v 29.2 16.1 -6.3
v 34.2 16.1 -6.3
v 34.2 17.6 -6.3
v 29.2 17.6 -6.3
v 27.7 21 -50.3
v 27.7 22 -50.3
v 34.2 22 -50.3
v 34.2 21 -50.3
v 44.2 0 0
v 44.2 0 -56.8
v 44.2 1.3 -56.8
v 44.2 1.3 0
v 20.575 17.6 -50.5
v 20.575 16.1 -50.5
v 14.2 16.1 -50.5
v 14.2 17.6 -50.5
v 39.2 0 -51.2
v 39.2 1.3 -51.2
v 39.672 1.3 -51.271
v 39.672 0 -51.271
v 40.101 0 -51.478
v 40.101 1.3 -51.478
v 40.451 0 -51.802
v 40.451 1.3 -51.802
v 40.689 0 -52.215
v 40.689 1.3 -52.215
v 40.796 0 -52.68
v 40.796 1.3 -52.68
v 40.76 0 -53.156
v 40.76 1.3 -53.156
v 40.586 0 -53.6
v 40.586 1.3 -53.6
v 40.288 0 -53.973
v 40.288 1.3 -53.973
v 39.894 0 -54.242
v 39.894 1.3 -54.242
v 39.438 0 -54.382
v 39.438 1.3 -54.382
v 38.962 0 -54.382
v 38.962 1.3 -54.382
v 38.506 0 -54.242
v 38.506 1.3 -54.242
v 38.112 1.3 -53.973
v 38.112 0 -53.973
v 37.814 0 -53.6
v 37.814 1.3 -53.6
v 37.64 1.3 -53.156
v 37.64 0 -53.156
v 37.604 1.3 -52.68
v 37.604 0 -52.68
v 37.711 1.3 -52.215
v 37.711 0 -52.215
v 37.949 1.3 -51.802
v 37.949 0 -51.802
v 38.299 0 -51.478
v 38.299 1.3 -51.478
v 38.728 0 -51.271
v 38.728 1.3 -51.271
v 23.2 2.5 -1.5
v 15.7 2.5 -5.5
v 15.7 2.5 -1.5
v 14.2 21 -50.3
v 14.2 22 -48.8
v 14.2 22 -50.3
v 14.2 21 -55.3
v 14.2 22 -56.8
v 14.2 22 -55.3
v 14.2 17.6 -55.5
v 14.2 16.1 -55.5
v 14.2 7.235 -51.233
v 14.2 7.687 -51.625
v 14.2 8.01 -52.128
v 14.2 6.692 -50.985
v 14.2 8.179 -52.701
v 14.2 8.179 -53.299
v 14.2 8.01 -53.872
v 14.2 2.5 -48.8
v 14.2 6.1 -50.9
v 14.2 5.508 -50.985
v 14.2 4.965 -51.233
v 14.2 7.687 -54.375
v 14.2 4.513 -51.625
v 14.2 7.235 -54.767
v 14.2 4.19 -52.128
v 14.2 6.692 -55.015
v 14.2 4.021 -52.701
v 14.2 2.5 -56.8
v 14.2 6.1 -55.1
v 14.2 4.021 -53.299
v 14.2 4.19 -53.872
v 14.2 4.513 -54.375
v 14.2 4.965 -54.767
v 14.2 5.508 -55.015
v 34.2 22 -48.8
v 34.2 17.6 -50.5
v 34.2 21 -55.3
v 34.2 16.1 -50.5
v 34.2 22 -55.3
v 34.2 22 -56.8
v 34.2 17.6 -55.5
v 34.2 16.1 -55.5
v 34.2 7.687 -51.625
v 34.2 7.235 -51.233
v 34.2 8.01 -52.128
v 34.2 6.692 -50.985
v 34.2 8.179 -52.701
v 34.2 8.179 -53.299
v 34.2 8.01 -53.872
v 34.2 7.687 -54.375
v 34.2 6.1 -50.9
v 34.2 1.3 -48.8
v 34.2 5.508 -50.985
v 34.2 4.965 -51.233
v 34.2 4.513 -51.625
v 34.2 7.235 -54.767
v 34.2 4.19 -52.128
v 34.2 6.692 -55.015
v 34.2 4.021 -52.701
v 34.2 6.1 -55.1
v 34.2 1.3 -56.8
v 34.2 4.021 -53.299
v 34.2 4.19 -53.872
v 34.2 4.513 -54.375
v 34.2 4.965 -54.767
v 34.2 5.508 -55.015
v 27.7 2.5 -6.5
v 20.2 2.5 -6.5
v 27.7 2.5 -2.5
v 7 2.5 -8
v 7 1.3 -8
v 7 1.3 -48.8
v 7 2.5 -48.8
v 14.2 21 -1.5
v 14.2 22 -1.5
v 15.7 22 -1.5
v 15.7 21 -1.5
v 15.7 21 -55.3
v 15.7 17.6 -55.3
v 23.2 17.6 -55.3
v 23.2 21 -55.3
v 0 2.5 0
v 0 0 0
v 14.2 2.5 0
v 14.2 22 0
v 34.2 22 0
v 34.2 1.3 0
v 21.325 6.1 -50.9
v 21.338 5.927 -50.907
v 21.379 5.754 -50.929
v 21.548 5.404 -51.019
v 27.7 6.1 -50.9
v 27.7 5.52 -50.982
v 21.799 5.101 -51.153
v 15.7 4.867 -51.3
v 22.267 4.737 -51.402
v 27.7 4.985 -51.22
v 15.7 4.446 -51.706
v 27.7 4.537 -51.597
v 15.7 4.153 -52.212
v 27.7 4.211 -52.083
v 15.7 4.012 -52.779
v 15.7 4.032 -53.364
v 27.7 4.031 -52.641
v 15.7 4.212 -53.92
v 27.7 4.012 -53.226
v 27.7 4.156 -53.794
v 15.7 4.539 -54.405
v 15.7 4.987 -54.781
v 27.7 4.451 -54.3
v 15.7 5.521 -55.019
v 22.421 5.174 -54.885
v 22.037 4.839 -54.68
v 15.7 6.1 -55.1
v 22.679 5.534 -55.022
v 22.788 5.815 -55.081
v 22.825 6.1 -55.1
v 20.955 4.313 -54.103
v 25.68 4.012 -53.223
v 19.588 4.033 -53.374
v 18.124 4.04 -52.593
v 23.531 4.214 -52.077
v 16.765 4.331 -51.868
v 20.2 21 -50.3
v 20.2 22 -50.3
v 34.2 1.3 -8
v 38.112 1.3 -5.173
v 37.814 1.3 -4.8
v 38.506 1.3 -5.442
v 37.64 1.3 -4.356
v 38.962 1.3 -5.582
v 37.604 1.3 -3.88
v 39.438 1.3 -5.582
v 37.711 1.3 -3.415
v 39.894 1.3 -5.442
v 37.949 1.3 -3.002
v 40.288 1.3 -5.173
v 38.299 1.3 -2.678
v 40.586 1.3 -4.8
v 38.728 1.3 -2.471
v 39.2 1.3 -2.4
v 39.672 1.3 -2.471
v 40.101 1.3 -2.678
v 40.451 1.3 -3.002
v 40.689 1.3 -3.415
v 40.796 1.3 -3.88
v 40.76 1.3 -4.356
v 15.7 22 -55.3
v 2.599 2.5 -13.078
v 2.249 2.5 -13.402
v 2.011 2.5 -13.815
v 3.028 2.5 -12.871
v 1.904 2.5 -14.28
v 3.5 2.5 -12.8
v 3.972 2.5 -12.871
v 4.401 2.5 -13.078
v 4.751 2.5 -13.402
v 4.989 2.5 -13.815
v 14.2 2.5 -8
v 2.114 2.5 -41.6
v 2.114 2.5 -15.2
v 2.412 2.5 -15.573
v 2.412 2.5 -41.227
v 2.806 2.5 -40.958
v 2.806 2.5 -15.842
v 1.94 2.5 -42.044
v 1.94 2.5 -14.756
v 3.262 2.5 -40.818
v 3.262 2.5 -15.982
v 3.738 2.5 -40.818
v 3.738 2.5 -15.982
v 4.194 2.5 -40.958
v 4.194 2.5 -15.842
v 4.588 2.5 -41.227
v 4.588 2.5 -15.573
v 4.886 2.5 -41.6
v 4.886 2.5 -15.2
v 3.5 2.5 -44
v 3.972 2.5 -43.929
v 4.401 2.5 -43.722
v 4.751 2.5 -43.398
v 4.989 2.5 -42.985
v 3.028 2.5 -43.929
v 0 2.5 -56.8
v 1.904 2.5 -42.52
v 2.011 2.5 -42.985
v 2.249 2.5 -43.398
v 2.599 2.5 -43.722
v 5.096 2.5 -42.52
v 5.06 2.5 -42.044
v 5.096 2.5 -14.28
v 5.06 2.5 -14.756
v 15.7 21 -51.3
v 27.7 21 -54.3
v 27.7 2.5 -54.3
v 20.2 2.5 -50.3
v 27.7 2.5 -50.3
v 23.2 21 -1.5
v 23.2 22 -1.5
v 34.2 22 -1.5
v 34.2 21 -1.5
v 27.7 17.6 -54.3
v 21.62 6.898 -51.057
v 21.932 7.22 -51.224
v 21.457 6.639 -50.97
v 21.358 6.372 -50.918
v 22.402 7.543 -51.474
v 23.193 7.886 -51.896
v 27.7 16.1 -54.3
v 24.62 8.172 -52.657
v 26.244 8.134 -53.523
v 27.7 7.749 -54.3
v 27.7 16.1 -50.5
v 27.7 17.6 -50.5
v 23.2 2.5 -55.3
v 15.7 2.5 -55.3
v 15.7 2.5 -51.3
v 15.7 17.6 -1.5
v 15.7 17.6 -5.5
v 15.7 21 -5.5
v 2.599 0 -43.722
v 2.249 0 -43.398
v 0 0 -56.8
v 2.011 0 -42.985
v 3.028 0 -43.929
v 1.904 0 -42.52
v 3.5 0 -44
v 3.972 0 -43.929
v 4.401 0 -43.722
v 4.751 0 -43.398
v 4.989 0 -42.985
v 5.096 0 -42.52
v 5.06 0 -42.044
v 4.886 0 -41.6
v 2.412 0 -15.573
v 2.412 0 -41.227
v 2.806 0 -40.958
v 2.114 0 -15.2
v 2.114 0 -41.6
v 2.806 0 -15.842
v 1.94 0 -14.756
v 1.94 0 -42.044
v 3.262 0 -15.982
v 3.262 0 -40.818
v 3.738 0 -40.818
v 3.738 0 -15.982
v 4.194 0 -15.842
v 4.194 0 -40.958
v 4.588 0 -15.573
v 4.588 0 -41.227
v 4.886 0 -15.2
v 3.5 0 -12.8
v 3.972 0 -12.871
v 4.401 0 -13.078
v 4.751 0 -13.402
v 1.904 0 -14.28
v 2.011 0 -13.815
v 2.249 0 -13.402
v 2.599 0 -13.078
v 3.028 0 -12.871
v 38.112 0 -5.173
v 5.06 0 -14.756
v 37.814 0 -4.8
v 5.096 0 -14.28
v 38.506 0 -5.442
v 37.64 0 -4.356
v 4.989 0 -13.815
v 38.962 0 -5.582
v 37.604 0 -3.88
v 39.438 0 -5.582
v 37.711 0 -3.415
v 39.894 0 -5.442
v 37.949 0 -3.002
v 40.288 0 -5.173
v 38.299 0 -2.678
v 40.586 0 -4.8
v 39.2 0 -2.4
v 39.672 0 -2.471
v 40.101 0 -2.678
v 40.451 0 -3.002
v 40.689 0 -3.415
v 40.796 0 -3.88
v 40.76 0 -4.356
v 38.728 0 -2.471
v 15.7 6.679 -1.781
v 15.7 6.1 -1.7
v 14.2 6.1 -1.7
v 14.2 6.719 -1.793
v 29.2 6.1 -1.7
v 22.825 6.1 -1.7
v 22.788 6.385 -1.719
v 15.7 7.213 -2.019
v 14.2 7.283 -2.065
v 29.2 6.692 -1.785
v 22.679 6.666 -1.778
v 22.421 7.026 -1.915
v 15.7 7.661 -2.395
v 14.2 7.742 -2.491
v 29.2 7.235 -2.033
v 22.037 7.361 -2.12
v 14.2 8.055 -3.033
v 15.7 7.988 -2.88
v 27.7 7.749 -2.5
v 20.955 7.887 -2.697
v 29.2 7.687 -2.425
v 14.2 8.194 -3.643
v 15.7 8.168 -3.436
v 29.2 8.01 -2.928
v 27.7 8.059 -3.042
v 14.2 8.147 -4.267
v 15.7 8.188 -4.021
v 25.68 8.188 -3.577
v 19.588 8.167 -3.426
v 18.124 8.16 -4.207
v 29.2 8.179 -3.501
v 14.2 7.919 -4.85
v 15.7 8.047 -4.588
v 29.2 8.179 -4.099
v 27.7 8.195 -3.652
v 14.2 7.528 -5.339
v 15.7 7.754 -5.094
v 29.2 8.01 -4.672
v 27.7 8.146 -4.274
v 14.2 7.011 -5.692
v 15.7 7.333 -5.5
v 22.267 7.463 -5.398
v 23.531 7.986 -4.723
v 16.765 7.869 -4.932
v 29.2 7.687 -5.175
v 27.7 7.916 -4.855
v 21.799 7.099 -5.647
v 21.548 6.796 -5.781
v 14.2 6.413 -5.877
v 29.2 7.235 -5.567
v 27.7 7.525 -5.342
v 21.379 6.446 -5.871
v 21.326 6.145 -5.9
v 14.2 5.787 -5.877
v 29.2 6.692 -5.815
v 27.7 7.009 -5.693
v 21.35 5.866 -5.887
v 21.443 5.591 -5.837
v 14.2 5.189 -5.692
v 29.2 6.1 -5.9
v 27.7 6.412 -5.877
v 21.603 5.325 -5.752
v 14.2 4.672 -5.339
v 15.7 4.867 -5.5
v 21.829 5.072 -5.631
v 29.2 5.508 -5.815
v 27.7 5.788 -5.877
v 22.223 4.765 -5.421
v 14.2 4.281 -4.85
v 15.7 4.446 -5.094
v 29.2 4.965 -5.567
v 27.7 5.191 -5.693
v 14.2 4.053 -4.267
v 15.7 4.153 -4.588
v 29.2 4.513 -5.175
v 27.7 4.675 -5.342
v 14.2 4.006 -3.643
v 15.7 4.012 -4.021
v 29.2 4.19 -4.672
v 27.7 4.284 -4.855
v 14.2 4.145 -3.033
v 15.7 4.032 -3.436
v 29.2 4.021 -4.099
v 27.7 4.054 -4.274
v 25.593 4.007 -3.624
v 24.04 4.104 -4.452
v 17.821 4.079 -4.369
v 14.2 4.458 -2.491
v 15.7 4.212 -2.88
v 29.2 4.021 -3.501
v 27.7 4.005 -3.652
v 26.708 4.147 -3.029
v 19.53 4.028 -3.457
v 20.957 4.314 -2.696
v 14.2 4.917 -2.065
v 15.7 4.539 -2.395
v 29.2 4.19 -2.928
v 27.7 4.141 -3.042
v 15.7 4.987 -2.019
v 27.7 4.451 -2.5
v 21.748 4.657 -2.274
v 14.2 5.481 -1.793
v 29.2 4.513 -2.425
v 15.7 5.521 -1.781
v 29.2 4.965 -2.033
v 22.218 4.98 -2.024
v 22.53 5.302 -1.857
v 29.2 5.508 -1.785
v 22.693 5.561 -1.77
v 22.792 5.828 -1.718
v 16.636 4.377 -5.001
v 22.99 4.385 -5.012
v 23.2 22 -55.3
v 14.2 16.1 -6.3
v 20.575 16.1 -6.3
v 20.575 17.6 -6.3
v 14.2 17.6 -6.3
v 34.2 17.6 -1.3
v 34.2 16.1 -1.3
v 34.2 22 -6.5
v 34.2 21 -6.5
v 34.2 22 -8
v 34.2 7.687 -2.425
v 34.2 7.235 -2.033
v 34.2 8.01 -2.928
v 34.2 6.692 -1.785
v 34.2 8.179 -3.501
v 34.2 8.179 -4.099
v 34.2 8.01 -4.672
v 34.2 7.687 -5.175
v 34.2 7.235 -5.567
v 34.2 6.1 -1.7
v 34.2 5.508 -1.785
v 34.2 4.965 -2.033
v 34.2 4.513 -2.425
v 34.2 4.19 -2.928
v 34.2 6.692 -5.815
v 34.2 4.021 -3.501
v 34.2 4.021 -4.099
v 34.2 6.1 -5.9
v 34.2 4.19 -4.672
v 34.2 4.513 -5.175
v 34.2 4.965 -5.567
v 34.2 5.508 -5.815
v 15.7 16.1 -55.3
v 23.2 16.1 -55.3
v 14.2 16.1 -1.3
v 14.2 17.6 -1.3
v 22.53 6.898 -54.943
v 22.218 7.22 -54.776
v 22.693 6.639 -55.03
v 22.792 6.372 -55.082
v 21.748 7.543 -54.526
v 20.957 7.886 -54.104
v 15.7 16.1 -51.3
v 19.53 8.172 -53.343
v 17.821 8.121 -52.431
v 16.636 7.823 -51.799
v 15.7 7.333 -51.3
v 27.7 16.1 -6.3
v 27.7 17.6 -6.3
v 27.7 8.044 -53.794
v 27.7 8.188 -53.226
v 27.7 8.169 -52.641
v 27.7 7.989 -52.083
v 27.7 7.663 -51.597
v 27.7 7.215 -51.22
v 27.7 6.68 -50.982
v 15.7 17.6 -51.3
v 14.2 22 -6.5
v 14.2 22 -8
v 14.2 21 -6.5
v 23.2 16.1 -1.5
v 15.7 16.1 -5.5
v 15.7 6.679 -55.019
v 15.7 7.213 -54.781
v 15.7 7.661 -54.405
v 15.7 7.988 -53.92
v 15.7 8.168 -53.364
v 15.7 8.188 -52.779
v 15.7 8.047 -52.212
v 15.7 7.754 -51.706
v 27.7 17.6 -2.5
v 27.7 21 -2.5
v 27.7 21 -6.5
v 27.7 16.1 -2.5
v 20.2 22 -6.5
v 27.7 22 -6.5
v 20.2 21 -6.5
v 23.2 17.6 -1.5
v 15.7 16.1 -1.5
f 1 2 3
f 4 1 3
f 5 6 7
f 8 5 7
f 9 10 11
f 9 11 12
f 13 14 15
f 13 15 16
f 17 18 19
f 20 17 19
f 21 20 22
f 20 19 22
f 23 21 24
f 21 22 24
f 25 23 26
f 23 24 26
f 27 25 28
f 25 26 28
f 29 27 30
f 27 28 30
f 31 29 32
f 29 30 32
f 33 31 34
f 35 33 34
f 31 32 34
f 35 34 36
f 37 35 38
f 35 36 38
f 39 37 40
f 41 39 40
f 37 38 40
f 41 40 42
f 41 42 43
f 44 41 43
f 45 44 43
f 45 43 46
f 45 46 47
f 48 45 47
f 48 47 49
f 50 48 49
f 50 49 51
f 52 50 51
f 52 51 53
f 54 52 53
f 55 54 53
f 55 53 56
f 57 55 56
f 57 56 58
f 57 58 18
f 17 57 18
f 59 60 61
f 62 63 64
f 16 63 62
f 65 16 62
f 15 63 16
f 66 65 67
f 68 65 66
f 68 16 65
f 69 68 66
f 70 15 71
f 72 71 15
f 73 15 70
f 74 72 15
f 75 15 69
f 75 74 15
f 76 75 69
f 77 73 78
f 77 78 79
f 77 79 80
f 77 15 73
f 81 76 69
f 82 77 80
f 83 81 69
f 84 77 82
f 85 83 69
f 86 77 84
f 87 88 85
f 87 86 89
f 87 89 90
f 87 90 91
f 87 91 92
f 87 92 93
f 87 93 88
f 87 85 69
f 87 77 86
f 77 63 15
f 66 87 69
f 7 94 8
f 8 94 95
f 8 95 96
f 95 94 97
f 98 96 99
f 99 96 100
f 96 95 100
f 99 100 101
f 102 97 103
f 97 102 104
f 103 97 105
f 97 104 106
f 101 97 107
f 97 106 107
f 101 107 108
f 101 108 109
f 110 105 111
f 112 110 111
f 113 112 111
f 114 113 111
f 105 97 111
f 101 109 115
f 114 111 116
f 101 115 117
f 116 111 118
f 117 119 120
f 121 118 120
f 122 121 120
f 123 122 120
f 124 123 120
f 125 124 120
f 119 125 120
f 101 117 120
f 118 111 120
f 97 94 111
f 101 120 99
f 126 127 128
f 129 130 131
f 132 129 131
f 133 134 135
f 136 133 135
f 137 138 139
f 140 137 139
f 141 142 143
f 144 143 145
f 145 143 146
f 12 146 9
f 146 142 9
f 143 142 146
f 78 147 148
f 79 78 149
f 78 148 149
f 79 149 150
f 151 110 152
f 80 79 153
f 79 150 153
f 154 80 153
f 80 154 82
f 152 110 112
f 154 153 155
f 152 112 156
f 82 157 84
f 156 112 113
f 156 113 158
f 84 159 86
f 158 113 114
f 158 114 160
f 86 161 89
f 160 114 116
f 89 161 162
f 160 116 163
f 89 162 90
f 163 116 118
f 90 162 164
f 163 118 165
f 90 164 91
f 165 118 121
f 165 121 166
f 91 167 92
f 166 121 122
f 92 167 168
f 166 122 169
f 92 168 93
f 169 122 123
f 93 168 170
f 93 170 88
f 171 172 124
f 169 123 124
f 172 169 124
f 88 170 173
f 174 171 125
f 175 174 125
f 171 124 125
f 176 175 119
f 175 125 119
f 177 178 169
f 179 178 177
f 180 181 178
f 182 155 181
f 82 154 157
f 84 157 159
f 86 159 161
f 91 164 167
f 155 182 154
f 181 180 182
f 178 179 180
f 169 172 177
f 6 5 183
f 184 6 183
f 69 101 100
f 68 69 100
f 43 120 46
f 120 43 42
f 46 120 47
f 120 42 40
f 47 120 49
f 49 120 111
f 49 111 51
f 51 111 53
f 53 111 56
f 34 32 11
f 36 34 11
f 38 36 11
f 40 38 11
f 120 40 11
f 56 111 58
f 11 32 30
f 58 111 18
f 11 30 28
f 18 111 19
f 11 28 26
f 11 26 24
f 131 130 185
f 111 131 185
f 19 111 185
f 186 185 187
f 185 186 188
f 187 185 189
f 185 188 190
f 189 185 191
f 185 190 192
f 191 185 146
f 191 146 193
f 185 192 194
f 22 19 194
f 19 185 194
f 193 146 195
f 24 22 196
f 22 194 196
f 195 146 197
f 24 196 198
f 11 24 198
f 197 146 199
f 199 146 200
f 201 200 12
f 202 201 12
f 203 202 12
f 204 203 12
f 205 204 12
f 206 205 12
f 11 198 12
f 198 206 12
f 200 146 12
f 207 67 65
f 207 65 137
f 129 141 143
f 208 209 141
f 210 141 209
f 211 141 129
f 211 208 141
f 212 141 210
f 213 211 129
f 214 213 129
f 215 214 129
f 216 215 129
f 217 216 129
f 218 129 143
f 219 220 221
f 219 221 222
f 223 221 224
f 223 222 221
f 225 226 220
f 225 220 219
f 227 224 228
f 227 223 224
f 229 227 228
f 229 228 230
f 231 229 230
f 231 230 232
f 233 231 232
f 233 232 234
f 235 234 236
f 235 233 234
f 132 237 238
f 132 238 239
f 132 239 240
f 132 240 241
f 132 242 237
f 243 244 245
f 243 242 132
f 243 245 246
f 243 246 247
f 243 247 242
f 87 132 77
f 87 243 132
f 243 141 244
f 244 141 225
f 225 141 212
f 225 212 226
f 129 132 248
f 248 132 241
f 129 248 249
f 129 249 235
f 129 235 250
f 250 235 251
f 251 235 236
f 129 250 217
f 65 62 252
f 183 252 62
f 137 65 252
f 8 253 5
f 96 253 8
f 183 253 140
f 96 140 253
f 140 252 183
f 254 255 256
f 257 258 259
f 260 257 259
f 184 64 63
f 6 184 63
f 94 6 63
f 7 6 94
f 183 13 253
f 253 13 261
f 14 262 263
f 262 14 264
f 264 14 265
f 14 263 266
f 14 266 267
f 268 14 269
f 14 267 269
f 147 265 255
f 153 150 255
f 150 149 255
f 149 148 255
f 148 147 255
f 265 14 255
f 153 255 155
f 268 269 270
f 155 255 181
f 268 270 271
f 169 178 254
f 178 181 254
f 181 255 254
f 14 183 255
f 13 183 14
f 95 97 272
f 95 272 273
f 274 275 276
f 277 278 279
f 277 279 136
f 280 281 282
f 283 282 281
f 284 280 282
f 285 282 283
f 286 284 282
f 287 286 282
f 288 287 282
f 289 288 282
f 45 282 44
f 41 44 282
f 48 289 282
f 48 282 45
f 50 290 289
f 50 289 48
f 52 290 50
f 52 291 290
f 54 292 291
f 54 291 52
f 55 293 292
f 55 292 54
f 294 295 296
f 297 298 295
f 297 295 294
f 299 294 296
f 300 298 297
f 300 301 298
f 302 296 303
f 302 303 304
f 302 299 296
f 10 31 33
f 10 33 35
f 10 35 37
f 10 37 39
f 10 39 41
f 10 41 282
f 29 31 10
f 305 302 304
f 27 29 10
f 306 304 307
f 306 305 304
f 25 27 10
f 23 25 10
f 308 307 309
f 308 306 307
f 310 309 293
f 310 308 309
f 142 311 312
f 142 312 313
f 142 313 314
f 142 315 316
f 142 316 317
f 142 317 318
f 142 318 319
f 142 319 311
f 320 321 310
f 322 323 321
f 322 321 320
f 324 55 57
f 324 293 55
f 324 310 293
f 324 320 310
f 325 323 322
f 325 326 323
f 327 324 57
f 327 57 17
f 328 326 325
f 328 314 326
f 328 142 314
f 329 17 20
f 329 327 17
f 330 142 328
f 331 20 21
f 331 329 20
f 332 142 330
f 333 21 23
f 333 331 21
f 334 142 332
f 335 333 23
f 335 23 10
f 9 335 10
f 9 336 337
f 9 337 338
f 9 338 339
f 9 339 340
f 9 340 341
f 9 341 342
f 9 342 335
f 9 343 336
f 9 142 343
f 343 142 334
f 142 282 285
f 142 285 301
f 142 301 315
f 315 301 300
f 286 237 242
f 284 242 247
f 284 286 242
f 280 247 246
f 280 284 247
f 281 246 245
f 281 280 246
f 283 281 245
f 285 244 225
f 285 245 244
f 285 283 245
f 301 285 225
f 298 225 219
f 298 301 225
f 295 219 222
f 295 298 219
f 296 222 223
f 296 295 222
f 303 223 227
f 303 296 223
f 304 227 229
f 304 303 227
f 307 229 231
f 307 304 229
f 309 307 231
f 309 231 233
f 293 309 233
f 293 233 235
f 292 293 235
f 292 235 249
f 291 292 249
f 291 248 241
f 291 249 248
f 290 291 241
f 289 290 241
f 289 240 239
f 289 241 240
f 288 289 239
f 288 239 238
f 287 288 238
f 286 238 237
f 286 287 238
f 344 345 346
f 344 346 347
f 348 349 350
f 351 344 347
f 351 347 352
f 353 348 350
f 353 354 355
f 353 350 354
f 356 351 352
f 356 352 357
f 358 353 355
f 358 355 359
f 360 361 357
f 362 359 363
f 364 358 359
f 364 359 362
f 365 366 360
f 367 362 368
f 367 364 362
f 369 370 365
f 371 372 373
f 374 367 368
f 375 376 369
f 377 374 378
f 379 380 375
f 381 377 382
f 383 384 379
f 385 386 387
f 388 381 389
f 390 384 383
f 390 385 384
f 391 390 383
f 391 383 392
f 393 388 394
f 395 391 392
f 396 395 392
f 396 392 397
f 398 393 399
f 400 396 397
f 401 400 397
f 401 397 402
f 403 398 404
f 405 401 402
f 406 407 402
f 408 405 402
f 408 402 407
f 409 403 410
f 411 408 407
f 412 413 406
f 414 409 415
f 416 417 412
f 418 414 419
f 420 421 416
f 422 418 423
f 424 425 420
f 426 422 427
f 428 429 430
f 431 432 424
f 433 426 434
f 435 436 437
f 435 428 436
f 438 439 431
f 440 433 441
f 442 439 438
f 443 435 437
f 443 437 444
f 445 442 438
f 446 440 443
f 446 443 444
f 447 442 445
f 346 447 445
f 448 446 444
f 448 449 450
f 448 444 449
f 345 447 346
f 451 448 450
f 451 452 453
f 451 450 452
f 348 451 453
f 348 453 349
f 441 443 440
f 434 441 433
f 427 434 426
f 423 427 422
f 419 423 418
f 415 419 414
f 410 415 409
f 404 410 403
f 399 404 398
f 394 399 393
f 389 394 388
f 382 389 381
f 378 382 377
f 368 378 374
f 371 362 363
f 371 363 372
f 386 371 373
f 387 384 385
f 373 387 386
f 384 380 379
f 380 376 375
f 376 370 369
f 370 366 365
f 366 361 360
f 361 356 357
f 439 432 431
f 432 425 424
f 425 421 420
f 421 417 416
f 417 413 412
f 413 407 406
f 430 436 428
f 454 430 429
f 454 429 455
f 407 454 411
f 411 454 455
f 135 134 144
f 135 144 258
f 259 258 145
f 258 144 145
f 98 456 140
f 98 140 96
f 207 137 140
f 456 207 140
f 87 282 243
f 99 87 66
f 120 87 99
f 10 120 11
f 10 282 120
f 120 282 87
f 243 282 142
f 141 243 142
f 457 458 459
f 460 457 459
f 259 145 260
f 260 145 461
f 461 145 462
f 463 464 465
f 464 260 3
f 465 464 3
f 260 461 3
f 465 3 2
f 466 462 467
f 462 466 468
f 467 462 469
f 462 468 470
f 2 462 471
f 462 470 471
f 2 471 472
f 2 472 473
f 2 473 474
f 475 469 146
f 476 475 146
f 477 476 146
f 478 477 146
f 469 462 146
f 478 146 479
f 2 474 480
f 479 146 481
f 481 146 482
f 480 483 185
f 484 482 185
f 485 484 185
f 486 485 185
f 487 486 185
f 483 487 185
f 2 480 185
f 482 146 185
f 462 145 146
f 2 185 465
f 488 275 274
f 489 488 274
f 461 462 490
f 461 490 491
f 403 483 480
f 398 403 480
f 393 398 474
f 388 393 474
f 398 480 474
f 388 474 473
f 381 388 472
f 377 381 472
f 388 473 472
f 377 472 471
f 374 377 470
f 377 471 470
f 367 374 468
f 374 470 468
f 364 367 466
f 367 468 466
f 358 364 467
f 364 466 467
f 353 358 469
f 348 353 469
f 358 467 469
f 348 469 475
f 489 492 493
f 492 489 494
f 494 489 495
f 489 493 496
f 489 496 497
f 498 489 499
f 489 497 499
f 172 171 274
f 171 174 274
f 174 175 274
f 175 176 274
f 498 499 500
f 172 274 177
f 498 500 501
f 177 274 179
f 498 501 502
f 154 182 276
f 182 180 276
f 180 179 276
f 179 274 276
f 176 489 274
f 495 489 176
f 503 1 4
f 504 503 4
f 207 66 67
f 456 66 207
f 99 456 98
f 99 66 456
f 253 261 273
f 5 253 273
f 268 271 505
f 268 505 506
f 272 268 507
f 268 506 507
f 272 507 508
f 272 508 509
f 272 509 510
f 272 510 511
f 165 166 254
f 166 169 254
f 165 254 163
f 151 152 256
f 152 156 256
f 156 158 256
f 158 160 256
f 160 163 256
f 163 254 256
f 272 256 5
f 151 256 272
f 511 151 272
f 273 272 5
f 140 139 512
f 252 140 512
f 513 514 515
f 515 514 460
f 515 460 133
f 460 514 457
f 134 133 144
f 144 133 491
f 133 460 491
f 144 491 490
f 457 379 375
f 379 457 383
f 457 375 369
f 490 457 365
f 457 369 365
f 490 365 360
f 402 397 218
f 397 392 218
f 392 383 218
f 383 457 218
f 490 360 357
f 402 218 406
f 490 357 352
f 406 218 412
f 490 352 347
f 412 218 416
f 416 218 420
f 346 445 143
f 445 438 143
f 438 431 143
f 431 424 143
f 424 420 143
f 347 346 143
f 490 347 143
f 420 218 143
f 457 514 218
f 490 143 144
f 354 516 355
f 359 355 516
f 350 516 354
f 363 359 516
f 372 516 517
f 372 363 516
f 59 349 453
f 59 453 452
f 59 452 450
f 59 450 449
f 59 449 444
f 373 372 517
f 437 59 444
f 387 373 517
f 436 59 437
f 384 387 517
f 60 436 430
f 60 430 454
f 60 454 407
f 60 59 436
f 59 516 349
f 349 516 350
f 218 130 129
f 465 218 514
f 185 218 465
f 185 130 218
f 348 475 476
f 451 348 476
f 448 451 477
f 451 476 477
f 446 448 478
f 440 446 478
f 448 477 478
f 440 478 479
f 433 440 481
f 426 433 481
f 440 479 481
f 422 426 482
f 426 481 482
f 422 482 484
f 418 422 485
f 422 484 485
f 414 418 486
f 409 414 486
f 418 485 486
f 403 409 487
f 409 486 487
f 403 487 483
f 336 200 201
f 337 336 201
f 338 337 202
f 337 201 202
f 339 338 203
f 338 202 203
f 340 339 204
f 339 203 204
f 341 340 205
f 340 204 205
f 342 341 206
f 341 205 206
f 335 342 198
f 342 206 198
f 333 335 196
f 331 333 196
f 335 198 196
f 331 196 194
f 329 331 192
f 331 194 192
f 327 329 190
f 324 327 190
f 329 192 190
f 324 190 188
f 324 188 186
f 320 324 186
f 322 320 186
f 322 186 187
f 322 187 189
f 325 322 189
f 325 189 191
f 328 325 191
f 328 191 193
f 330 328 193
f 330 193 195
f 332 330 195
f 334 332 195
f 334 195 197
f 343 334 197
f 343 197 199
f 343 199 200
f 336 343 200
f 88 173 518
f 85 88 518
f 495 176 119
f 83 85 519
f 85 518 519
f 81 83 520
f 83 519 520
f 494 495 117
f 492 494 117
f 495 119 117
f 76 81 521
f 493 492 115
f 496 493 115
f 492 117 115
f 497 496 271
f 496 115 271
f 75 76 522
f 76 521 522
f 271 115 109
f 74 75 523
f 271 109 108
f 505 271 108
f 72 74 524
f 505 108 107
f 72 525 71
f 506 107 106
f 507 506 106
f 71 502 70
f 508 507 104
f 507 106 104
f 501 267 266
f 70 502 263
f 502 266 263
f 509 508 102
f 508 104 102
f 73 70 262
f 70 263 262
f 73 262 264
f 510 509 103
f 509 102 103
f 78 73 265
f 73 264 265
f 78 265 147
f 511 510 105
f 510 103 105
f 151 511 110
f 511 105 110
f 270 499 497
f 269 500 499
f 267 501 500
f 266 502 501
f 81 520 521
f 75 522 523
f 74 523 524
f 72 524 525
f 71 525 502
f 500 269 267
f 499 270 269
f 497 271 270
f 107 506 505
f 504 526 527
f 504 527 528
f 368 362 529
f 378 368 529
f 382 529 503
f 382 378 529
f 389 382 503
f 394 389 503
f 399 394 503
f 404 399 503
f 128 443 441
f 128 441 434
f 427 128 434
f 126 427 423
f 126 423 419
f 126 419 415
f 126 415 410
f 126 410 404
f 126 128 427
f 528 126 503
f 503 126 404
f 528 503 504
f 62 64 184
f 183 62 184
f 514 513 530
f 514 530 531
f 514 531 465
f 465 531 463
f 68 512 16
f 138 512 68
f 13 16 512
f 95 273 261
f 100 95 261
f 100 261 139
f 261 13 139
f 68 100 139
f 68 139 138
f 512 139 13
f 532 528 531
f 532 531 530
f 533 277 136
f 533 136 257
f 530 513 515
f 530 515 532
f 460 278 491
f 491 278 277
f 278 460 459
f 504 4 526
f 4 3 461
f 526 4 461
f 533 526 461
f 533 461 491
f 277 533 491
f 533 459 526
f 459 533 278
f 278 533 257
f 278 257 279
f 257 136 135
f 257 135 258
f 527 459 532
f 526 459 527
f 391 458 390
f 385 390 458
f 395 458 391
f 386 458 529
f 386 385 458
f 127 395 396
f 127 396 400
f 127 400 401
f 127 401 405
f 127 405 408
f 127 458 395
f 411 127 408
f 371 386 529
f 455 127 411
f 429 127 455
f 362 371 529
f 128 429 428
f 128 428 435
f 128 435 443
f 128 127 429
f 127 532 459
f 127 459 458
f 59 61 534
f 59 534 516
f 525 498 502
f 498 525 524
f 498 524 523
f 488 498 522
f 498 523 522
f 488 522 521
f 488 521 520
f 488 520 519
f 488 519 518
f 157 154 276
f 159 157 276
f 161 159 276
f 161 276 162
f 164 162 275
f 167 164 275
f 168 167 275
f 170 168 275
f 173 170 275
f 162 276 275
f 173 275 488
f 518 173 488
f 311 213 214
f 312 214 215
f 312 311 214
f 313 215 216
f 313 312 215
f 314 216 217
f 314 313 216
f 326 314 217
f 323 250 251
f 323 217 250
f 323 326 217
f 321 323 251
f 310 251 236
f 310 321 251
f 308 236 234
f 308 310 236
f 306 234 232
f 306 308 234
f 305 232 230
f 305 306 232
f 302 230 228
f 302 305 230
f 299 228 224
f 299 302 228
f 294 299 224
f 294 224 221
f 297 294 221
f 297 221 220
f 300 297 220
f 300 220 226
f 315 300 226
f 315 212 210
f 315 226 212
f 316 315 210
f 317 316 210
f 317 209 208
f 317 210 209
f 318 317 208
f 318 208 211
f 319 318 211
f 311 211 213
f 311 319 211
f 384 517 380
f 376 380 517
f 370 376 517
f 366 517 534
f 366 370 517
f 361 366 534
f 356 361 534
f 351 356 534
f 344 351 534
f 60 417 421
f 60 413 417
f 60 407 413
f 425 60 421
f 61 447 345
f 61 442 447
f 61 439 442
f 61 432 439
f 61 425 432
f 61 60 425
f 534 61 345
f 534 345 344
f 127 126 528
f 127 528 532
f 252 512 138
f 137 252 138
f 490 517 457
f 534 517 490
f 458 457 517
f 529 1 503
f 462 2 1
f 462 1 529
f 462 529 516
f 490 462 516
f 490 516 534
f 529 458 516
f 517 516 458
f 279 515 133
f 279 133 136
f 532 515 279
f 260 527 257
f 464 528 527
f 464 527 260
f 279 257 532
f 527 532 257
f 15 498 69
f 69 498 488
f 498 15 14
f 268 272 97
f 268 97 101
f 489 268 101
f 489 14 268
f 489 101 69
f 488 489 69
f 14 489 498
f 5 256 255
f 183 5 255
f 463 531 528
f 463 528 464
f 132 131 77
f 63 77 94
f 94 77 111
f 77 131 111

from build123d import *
from build123d.topology import SkipClean

# Parameters (mm, degrees)
BOSS_EXTRU_1_DEPTH      = 2.5
ESQUISSE2_W             = 5
ESQUISSE2_H             = 8
BOSS_EXTRU_2_DEPTH      = 22
ENL_V_MAT_EXTRU_2_REACH = 71.856
ESQUISSE4_R             = 1.6
EXTRU_MINCE1_OUTLINE_W  = 15
EXTRU_MINCE1_OUTLINE_H  = 8
EXTRU_MINCE1_DEPTH      = 19.5
BOSS_EXTRU_3_DEPTH      = 1.3
ESQUISSE3_R             = 2.1
ESQUISSE3_W             = 5
ESQUISSE3_H             = 1.5
ENL_V_MAT_EXTRU_1_DEPTH = 70.856137884
ENL_V_MAT_EXTRU_3_REACH = 76.889
ESQUISSE7_R             = 1.6
ESQUISSE8_W             = 20
ESQUISSE8_H             = 5
ENL_V_MAT_EXTRU_5_DEPTH = 1


# Read off the part's stored shape, not the designer's step: Extru.-Mince1
with BuildPart() as part:
    # Esquisse1 → Boss.-Extru.1 (new body)
    with BuildSketch(Plane(origin=(0, 0, 0), x_dir=(1, 0, 0), z_dir=(0, 1, 0))):
        Polygon((0, 0), (29.2, 0), (29.2, 8), (7, 8), (7, 48.8), (29.2, 48.8), (29.2, 56.8), (0, 56.8), align=None)
    extrude(amount=BOSS_EXTRU_1_DEPTH)

    # Esquisse2 → Boss.-Extru.2 (add)
    with BuildSketch(Plane(origin=(0, 0, 0), x_dir=(1, 0, 0), z_dir=(0, 1, 0))):
        with Locations((31.7, 52.8)):
            Rectangle(ESQUISSE2_W, ESQUISSE2_H)
        with Locations((31.7, 4)):
            Rectangle(ESQUISSE2_W, ESQUISSE2_H)
    extrude(amount=BOSS_EXTRU_2_DEPTH)

    # Esquisse4 → Enlèv. mat.-Extru.2 (cut, up to next)
    with BuildSketch(Plane(origin=(0, 0, 0), x_dir=(1, 0, 0), z_dir=(0, 1, 0)), mode=Mode.PRIVATE) as enl_v_mat_extru_2_sk1:
        with Locations(Location((3.5, 14.4, 0), (0, 0, 270))):
            Circle(ESQUISSE4_R)
    enl_v_mat_extru_2_tool1 = extrude(enl_v_mat_extru_2_sk1.sketch, amount=ENL_V_MAT_EXTRU_2_REACH, mode=Mode.PRIVATE) & part.part
    # Esquisse4 → Enlèv. mat.-Extru.2 (cut, up to next)
    with BuildSketch(Plane(origin=(0, 0, 0), x_dir=(1, 0, 0), z_dir=(0, 1, 0)), mode=Mode.PRIVATE) as enl_v_mat_extru_2_sk2:
        with Locations(Location((3.5, 42.4, 0), (0, 0, 90))):
            Circle(ESQUISSE4_R)
    enl_v_mat_extru_2_tool2 = extrude(enl_v_mat_extru_2_sk2.sketch, amount=ENL_V_MAT_EXTRU_2_REACH, mode=Mode.PRIVATE) & part.part
    add(enl_v_mat_extru_2_tool1.solids().sort_by_distance((3.5, 0, -14.4))[0], mode=Mode.SUBTRACT)
    add(enl_v_mat_extru_2_tool2.solids().sort_by_distance((3.5, 0, -42.4))[0], mode=Mode.SUBTRACT)

    # Extru.-Mince1 outline → Extru.-Mince1 (add)
    with BuildSketch(Plane(origin=(0, 2.5, 0), x_dir=(1, 0, 0), z_dir=(0, 1, 0))):
        with Locations((21.7, 52.8)):
            Rectangle(EXTRU_MINCE1_OUTLINE_W, EXTRU_MINCE1_OUTLINE_H)
        Polygon((27.7, 50.3), (20.2, 50.3), (27.7, 54.3), align=None, mode=Mode.SUBTRACT)
        Polygon((15.7, 51.3), (15.7, 55.3), (23.2, 55.3), align=None, mode=Mode.SUBTRACT)
    extru_mince1 = extrude(amount=EXTRU_MINCE1_DEPTH)

    # Esquisse6 → Boss.-Extru.3 (add)
    with BuildSketch(Plane.XZ):
        Polygon((34.2, -8), (7, -8), (7, -48.8), (34.2, -48.8), (34.2, -56.8), (44.2, -56.8), (44.2, 0), (34.2, 0), align=None)
    extrude(amount=-BOSS_EXTRU_3_DEPTH)

    # Esquisse3 → Enlèv. mat.-Extru.1 (cut, through all)
    with BuildSketch(Plane(origin=(34.2, 0, 0), x_dir=(0, 0, -1), z_dir=(1, 0, 0))):
        with Locations((3.8, 6.1)):
            Circle(ESQUISSE3_R)
        with Locations((53, 6.1)):
            Circle(ESQUISSE3_R)
        with Locations((3.8, 16.85)):
            Rectangle(ESQUISSE3_W, ESQUISSE3_H)
        with Locations((53, 16.85)):
            Rectangle(ESQUISSE3_W, ESQUISSE3_H)
    enl_v_mat_extru_1 = extrude(amount=-ENL_V_MAT_EXTRU_1_DEPTH, mode=Mode.SUBTRACT)

    # Symétrie1: Extru.-Mince1, Enlèv. mat.-Extru.1 across plane
    with SkipClean():  # the faces are left unmerged after this step: merging them gives an invalid solid
        add(extru_mince1.mirror(Plane(origin=(0, 0, -28.4), x_dir=(1, 0, 0), z_dir=(0, 0, -1))))
        add(enl_v_mat_extru_1.mirror(Plane(origin=(0, 0, -28.4), x_dir=(1, 0, 0), z_dir=(0, 0, -1))), mode=Mode.SUBTRACT)

    # Esquisse7 → Enlèv. mat.-Extru.3 (cut, up to next)
    with BuildSketch(Plane(origin=(0, 1.3, 0), x_dir=(1, 0, 0), z_dir=(0, 1, 0)), mode=Mode.PRIVATE) as enl_v_mat_extru_3_sk1:
        with Locations(Location((39.2, 52.8, 0), (0, 0, 270))):
            Circle(ESQUISSE7_R)
    enl_v_mat_extru_3_tool1 = extrude(enl_v_mat_extru_3_sk1.sketch, amount=-ENL_V_MAT_EXTRU_3_REACH, mode=Mode.PRIVATE) & part.part
    # Esquisse7 → Enlèv. mat.-Extru.3 (cut, up to next)
    with BuildSketch(Plane(origin=(0, 1.3, 0), x_dir=(1, 0, 0), z_dir=(0, 1, 0)), mode=Mode.PRIVATE) as enl_v_mat_extru_3_sk2:
        with Locations(Location((39.2, 4, 0), (0, 0, 270))):
            Circle(ESQUISSE7_R)
    enl_v_mat_extru_3_tool2 = extrude(enl_v_mat_extru_3_sk2.sketch, amount=-ENL_V_MAT_EXTRU_3_REACH, mode=Mode.PRIVATE) & part.part
    add(enl_v_mat_extru_3_tool1.solids().sort_by_distance((39.2, 1.3, -52.8))[0], mode=Mode.SUBTRACT)
    add(enl_v_mat_extru_3_tool2.solids().sort_by_distance((39.2, 1.3, -4))[0], mode=Mode.SUBTRACT)

    # Esquisse8 → Enlèv. mat.-Extru.5 (cut)
    with SkipClean():  # the faces are left unmerged after this step: merging them gives an invalid solid
        with BuildSketch(Plane(origin=(0, 22, 0), x_dir=(1, 0, 0), z_dir=(0, 1, 0))):
            with Locations((24.2, 52.8)):
                Rectangle(ESQUISSE8_W, ESQUISSE8_H)
            with Locations((24.2, 4)):
                Rectangle(ESQUISSE8_W, ESQUISSE8_H)
        extrude(amount=-ENL_V_MAT_EXTRU_5_DEPTH, mode=Mode.SUBTRACT)


solid = part.part
